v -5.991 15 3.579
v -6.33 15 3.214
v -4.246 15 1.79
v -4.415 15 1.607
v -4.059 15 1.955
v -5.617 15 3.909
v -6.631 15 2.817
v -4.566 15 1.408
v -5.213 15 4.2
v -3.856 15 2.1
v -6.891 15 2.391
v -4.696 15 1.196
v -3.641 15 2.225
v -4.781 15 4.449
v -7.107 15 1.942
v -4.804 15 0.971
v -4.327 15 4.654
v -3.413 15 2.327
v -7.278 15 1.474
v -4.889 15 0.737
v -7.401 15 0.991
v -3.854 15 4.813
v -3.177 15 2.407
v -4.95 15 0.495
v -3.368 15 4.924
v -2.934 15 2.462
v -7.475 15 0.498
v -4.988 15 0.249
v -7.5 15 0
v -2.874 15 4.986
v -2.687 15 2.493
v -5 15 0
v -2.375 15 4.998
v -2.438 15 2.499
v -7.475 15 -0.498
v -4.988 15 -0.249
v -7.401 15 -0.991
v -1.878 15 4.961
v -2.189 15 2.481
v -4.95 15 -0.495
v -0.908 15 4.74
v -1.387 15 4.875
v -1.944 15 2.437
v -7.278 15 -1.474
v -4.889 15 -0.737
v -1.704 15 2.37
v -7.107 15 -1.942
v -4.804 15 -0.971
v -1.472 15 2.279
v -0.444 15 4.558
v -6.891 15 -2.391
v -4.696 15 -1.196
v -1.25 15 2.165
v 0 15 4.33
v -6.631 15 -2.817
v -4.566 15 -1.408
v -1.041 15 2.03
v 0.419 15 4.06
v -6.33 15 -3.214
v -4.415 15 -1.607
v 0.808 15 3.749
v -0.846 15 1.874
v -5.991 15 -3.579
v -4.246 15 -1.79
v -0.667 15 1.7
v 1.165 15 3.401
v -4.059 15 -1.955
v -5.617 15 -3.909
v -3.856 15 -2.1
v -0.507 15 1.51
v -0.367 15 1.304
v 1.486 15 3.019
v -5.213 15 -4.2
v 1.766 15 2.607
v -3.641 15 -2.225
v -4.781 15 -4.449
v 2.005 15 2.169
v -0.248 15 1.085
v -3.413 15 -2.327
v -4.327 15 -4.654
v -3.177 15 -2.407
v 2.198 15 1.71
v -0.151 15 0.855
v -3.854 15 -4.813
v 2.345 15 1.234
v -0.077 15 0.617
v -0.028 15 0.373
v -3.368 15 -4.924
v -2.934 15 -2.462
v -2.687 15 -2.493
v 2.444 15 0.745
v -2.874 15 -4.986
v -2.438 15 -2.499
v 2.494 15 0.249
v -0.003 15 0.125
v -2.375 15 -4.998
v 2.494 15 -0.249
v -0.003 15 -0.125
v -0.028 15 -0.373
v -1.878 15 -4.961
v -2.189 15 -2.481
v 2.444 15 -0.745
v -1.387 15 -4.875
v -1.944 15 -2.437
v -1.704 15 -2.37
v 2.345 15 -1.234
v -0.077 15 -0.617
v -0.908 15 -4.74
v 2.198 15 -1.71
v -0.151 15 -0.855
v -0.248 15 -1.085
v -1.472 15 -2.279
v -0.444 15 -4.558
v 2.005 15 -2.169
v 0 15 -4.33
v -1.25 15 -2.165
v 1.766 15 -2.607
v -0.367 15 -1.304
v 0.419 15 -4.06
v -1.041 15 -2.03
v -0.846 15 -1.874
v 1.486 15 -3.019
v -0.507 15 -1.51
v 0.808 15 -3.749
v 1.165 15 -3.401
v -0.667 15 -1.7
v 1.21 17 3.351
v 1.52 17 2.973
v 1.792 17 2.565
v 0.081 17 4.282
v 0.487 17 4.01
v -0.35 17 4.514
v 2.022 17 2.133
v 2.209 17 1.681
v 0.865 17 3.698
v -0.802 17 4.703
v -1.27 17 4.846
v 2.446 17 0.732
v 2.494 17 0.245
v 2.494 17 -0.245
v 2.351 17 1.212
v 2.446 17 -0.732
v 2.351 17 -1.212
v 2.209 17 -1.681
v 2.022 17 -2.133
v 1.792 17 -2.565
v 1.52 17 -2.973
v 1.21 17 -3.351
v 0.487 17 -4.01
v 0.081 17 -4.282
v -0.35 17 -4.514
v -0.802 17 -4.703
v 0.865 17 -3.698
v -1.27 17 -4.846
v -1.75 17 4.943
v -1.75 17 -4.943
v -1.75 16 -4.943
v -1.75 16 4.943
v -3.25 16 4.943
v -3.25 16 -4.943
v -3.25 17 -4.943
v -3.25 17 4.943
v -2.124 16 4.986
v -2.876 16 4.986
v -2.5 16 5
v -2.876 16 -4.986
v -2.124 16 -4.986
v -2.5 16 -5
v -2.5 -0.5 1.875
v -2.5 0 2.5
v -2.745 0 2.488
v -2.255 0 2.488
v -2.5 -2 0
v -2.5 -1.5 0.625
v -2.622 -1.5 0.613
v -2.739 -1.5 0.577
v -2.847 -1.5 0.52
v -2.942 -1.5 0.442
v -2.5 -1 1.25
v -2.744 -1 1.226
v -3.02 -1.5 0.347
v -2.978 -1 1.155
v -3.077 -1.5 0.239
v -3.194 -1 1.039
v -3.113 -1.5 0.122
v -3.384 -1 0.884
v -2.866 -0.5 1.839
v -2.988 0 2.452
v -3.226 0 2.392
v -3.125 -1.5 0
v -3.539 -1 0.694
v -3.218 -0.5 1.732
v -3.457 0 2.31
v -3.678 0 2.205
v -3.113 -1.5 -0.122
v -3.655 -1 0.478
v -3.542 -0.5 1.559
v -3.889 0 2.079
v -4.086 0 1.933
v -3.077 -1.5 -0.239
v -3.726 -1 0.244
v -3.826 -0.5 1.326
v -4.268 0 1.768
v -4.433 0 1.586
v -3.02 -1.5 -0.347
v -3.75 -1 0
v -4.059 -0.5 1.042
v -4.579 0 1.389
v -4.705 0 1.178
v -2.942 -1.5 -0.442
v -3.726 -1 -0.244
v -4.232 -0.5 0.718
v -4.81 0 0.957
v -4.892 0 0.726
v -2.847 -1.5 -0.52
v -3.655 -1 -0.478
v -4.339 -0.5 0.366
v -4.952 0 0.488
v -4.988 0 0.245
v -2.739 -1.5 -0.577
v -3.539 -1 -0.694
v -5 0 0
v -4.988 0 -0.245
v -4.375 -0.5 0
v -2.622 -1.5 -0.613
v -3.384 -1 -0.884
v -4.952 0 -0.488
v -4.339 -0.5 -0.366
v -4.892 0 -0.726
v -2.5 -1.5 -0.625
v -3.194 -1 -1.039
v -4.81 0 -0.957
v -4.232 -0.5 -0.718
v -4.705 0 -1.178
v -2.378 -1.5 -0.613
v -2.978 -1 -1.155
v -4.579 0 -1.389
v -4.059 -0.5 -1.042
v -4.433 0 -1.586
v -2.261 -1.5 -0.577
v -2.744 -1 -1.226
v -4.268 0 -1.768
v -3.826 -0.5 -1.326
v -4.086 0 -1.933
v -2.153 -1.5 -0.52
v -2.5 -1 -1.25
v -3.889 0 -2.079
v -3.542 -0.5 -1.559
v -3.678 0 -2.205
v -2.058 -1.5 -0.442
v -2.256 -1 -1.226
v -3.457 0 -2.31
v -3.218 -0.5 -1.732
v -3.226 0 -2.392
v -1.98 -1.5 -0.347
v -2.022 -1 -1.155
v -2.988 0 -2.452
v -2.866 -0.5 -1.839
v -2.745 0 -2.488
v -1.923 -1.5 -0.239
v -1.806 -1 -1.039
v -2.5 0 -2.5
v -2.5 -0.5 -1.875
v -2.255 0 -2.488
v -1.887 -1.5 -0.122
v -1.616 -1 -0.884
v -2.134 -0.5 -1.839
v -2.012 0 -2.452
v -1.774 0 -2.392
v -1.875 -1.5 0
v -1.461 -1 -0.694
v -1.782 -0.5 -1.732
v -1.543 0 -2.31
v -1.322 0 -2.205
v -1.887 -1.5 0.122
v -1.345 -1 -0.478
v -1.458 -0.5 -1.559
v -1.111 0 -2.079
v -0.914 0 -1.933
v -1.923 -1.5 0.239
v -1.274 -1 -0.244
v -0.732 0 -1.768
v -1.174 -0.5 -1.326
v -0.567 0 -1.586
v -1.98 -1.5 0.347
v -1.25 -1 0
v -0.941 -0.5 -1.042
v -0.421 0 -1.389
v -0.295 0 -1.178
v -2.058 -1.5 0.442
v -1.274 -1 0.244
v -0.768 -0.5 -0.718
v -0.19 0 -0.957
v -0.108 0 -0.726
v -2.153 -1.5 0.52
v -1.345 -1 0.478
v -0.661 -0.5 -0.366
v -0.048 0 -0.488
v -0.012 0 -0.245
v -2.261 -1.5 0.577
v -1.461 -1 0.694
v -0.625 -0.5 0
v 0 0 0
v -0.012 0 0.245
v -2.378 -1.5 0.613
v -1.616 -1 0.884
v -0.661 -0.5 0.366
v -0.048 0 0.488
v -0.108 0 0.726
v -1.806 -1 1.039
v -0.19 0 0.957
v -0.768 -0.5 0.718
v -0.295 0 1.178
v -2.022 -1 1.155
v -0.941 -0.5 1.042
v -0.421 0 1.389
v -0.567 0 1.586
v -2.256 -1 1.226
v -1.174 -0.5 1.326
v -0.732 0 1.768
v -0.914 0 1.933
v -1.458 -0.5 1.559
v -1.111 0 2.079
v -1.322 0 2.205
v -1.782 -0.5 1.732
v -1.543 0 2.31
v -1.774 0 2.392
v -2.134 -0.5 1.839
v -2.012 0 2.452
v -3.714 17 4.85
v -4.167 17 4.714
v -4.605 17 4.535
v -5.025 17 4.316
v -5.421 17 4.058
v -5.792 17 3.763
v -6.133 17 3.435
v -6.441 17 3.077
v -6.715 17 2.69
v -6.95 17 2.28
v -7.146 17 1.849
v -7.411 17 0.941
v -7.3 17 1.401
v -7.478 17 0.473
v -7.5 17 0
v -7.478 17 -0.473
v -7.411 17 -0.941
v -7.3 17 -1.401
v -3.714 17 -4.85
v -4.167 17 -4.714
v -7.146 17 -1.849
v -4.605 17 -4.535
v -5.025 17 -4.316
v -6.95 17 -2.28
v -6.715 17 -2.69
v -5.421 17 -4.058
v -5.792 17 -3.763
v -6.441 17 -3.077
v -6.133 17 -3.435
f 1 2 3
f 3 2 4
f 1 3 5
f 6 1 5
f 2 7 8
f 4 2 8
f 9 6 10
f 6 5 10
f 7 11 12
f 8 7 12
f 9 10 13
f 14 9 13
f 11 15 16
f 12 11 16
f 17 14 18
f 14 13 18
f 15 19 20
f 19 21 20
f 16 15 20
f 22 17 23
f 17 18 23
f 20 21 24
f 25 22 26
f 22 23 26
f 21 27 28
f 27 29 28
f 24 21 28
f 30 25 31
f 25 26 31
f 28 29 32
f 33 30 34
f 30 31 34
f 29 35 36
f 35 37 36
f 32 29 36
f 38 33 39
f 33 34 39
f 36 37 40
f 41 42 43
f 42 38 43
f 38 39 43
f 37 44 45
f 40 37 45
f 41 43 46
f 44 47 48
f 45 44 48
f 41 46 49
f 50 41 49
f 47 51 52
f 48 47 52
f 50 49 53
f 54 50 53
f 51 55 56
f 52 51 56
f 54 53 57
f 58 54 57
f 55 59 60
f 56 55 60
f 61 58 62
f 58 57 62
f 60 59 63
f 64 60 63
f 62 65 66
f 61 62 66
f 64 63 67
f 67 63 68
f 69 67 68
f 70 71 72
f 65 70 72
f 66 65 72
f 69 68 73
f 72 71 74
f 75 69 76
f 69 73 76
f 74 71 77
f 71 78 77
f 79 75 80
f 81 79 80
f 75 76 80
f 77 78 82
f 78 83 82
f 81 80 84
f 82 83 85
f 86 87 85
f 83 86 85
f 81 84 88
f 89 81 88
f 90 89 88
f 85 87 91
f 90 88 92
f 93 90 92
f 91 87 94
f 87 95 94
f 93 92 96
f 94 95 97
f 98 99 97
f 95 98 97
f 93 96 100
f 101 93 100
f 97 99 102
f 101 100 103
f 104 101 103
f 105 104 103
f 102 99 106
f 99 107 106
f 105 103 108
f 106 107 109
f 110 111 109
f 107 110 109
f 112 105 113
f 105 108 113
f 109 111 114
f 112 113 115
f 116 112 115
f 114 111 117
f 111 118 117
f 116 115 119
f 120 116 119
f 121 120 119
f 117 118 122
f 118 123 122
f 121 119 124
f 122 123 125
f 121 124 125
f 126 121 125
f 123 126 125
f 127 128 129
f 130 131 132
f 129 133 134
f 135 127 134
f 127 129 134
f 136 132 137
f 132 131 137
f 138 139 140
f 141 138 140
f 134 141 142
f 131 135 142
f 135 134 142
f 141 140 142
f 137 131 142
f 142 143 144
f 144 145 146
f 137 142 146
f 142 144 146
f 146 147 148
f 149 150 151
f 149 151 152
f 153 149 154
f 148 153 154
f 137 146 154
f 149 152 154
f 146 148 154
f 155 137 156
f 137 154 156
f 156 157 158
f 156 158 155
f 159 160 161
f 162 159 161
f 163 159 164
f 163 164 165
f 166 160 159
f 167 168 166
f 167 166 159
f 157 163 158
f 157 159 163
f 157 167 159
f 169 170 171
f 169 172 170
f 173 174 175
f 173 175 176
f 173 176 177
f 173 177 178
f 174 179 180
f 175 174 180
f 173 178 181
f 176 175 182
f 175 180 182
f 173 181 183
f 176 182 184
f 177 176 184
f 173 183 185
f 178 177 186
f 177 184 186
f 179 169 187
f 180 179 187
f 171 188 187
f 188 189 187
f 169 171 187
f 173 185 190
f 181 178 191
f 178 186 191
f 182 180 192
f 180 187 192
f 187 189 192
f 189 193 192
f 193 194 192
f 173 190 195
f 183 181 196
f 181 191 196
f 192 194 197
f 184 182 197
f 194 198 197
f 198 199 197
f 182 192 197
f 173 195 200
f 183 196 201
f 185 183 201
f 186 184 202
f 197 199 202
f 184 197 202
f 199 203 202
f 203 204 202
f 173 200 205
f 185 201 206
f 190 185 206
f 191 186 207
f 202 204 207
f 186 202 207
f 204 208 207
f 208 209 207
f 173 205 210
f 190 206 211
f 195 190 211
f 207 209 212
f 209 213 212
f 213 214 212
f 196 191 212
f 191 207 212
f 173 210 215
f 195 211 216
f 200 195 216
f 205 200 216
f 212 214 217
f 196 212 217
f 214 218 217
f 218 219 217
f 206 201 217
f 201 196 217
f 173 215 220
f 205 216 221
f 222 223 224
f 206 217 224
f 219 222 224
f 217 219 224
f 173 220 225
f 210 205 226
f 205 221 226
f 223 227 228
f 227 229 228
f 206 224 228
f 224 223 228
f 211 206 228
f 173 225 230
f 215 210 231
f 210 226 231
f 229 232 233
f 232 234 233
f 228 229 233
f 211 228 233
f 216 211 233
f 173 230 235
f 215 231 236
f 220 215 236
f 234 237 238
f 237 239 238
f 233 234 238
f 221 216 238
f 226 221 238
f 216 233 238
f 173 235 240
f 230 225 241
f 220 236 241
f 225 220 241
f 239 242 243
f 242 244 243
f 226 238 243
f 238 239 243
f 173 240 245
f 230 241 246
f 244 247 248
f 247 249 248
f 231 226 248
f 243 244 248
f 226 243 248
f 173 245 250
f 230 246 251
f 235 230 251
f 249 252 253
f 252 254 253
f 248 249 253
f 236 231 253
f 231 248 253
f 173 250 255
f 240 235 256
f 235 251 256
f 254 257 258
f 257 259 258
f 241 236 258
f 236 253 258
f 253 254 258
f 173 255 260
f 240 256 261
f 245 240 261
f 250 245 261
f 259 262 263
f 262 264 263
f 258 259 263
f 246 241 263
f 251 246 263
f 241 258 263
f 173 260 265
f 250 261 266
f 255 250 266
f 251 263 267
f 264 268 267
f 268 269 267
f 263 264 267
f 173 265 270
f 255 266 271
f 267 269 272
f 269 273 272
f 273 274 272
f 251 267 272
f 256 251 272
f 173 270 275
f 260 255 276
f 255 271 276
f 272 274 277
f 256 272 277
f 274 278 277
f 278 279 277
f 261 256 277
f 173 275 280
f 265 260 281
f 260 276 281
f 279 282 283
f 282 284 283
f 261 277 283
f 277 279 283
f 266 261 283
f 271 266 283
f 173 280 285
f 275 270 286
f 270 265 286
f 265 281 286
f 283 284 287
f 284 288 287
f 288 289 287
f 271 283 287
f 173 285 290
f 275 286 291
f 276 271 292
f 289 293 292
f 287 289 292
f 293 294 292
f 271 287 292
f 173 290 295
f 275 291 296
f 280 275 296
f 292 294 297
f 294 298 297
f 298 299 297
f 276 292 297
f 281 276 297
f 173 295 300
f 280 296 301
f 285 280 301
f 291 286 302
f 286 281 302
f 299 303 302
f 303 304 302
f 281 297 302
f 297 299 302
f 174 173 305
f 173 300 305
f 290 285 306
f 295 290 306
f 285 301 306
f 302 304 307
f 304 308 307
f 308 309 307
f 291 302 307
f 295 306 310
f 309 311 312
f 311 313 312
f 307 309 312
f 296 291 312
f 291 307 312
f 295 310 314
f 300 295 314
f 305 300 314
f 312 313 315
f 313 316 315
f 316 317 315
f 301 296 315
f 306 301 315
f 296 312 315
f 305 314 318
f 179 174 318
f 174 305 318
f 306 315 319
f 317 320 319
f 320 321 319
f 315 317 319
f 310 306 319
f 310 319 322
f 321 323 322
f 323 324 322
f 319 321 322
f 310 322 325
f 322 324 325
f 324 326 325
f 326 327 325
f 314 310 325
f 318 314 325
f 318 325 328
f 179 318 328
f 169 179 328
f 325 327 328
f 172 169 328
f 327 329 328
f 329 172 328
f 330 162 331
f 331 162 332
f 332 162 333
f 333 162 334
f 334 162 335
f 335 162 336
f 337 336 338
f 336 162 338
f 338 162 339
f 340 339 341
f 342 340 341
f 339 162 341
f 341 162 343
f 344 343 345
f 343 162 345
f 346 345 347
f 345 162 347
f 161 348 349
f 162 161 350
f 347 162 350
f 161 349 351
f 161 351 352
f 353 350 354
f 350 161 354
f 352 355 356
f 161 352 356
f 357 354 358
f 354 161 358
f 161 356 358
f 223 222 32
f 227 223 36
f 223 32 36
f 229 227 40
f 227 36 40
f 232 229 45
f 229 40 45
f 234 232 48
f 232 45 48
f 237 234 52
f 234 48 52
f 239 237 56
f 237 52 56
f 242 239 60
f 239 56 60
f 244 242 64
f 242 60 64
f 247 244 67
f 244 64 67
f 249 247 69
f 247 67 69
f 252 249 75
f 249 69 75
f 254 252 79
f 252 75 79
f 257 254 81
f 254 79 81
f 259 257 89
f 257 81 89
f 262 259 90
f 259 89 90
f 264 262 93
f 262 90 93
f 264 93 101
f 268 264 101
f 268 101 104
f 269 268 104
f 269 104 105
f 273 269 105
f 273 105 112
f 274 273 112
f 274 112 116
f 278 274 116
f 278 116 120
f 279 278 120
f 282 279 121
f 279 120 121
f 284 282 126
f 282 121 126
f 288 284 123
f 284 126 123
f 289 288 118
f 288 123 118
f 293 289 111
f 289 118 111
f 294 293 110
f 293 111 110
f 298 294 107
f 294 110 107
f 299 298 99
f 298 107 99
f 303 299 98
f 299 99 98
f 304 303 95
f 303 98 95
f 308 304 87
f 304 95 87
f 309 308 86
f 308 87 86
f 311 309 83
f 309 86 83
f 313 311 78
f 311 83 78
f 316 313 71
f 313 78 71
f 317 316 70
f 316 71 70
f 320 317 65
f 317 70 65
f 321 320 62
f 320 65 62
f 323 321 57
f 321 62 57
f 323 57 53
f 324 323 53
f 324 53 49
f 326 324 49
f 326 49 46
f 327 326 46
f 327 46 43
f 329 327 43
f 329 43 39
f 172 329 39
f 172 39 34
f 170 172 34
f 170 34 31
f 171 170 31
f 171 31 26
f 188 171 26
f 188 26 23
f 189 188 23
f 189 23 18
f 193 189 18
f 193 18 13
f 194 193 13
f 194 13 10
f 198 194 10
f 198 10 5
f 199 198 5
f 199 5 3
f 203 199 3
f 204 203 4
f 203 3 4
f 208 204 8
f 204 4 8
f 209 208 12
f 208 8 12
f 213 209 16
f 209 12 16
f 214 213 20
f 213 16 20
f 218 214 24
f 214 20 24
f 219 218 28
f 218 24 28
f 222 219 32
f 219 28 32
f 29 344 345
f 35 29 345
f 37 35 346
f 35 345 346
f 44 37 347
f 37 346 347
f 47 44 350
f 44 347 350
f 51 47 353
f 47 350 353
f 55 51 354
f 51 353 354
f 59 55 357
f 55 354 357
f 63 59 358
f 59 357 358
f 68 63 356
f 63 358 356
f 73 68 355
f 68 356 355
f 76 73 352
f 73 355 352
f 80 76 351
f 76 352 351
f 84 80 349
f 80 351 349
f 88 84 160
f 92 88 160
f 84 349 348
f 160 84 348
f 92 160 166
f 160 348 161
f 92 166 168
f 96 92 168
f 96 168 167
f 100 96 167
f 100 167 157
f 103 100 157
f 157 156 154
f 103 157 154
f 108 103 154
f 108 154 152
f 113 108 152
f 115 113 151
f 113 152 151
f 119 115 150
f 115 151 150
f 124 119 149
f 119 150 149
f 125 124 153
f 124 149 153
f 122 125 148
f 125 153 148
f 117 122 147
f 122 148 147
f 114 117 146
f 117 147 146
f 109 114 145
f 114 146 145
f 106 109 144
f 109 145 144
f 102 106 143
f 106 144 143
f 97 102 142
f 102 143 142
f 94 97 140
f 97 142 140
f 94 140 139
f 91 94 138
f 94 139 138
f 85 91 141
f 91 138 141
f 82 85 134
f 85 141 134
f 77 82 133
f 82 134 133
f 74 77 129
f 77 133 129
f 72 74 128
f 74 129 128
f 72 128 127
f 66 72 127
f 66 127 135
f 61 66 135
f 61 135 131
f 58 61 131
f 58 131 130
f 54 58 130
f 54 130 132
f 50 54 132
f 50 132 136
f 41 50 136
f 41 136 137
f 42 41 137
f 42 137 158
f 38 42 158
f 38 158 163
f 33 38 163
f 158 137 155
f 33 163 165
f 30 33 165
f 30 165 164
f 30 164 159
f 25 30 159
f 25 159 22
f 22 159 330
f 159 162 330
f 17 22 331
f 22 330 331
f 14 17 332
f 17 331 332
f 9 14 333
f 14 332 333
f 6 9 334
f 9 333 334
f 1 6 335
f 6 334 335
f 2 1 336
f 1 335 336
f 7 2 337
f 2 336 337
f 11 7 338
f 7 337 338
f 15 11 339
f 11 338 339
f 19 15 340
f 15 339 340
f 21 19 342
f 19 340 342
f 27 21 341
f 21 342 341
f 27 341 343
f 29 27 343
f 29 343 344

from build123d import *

# Parameters (mm, degrees)
CUT_EXTRUDE1_DEPTH      = 20.241881405
CUT_EXTRUDE1_DEPTH_BACK = 20.241881405
SKETCH2_W               = 1.5
SKETCH2_H               = 1


with BuildPart() as part:
    # Sketch1 → Revolve1 (revolve)
    with BuildSketch(Plane.XY, mode=Mode.PRIVATE) as revolve1_sk:
        Polygon((0, 0), (0, 15), (2.5, 15), (2.5, 17), (-2.5, 17), (-2.5, 0), align=None)
    revolve(revolve1_sk.sketch.rotate(Axis((-2.5, 17, 0), (0, -1, 0)), 180), axis=Axis((-2.5, 17, 0), (0, -1, 0)))

    # Sketch2 → Cut-Extrude1 (cut, two sides: drawn at the far end of the back side and taken through both)
    with BuildSketch(Plane.XY.offset(-CUT_EXTRUDE1_DEPTH_BACK)):
        with Locations((-2.5, 16.5)):
            Rectangle(SKETCH2_W, SKETCH2_H)
    extrude(amount=CUT_EXTRUDE1_DEPTH + CUT_EXTRUDE1_DEPTH_BACK, mode=Mode.SUBTRACT)

    # Sketch3 → Revolve2 (revolve)
    with BuildSketch(Plane.XY, mode=Mode.PRIVATE) as revolve2_sk:
        Polygon((-2.5, 0), (-2.5, -2), (0, 0), align=None)
    revolve(revolve2_sk.sketch.rotate(Axis((-2.5, 0, 0), (0, -1, 0)), 90), axis=Axis((-2.5, 0, 0), (0, -1, 0)))


solid = part.part
